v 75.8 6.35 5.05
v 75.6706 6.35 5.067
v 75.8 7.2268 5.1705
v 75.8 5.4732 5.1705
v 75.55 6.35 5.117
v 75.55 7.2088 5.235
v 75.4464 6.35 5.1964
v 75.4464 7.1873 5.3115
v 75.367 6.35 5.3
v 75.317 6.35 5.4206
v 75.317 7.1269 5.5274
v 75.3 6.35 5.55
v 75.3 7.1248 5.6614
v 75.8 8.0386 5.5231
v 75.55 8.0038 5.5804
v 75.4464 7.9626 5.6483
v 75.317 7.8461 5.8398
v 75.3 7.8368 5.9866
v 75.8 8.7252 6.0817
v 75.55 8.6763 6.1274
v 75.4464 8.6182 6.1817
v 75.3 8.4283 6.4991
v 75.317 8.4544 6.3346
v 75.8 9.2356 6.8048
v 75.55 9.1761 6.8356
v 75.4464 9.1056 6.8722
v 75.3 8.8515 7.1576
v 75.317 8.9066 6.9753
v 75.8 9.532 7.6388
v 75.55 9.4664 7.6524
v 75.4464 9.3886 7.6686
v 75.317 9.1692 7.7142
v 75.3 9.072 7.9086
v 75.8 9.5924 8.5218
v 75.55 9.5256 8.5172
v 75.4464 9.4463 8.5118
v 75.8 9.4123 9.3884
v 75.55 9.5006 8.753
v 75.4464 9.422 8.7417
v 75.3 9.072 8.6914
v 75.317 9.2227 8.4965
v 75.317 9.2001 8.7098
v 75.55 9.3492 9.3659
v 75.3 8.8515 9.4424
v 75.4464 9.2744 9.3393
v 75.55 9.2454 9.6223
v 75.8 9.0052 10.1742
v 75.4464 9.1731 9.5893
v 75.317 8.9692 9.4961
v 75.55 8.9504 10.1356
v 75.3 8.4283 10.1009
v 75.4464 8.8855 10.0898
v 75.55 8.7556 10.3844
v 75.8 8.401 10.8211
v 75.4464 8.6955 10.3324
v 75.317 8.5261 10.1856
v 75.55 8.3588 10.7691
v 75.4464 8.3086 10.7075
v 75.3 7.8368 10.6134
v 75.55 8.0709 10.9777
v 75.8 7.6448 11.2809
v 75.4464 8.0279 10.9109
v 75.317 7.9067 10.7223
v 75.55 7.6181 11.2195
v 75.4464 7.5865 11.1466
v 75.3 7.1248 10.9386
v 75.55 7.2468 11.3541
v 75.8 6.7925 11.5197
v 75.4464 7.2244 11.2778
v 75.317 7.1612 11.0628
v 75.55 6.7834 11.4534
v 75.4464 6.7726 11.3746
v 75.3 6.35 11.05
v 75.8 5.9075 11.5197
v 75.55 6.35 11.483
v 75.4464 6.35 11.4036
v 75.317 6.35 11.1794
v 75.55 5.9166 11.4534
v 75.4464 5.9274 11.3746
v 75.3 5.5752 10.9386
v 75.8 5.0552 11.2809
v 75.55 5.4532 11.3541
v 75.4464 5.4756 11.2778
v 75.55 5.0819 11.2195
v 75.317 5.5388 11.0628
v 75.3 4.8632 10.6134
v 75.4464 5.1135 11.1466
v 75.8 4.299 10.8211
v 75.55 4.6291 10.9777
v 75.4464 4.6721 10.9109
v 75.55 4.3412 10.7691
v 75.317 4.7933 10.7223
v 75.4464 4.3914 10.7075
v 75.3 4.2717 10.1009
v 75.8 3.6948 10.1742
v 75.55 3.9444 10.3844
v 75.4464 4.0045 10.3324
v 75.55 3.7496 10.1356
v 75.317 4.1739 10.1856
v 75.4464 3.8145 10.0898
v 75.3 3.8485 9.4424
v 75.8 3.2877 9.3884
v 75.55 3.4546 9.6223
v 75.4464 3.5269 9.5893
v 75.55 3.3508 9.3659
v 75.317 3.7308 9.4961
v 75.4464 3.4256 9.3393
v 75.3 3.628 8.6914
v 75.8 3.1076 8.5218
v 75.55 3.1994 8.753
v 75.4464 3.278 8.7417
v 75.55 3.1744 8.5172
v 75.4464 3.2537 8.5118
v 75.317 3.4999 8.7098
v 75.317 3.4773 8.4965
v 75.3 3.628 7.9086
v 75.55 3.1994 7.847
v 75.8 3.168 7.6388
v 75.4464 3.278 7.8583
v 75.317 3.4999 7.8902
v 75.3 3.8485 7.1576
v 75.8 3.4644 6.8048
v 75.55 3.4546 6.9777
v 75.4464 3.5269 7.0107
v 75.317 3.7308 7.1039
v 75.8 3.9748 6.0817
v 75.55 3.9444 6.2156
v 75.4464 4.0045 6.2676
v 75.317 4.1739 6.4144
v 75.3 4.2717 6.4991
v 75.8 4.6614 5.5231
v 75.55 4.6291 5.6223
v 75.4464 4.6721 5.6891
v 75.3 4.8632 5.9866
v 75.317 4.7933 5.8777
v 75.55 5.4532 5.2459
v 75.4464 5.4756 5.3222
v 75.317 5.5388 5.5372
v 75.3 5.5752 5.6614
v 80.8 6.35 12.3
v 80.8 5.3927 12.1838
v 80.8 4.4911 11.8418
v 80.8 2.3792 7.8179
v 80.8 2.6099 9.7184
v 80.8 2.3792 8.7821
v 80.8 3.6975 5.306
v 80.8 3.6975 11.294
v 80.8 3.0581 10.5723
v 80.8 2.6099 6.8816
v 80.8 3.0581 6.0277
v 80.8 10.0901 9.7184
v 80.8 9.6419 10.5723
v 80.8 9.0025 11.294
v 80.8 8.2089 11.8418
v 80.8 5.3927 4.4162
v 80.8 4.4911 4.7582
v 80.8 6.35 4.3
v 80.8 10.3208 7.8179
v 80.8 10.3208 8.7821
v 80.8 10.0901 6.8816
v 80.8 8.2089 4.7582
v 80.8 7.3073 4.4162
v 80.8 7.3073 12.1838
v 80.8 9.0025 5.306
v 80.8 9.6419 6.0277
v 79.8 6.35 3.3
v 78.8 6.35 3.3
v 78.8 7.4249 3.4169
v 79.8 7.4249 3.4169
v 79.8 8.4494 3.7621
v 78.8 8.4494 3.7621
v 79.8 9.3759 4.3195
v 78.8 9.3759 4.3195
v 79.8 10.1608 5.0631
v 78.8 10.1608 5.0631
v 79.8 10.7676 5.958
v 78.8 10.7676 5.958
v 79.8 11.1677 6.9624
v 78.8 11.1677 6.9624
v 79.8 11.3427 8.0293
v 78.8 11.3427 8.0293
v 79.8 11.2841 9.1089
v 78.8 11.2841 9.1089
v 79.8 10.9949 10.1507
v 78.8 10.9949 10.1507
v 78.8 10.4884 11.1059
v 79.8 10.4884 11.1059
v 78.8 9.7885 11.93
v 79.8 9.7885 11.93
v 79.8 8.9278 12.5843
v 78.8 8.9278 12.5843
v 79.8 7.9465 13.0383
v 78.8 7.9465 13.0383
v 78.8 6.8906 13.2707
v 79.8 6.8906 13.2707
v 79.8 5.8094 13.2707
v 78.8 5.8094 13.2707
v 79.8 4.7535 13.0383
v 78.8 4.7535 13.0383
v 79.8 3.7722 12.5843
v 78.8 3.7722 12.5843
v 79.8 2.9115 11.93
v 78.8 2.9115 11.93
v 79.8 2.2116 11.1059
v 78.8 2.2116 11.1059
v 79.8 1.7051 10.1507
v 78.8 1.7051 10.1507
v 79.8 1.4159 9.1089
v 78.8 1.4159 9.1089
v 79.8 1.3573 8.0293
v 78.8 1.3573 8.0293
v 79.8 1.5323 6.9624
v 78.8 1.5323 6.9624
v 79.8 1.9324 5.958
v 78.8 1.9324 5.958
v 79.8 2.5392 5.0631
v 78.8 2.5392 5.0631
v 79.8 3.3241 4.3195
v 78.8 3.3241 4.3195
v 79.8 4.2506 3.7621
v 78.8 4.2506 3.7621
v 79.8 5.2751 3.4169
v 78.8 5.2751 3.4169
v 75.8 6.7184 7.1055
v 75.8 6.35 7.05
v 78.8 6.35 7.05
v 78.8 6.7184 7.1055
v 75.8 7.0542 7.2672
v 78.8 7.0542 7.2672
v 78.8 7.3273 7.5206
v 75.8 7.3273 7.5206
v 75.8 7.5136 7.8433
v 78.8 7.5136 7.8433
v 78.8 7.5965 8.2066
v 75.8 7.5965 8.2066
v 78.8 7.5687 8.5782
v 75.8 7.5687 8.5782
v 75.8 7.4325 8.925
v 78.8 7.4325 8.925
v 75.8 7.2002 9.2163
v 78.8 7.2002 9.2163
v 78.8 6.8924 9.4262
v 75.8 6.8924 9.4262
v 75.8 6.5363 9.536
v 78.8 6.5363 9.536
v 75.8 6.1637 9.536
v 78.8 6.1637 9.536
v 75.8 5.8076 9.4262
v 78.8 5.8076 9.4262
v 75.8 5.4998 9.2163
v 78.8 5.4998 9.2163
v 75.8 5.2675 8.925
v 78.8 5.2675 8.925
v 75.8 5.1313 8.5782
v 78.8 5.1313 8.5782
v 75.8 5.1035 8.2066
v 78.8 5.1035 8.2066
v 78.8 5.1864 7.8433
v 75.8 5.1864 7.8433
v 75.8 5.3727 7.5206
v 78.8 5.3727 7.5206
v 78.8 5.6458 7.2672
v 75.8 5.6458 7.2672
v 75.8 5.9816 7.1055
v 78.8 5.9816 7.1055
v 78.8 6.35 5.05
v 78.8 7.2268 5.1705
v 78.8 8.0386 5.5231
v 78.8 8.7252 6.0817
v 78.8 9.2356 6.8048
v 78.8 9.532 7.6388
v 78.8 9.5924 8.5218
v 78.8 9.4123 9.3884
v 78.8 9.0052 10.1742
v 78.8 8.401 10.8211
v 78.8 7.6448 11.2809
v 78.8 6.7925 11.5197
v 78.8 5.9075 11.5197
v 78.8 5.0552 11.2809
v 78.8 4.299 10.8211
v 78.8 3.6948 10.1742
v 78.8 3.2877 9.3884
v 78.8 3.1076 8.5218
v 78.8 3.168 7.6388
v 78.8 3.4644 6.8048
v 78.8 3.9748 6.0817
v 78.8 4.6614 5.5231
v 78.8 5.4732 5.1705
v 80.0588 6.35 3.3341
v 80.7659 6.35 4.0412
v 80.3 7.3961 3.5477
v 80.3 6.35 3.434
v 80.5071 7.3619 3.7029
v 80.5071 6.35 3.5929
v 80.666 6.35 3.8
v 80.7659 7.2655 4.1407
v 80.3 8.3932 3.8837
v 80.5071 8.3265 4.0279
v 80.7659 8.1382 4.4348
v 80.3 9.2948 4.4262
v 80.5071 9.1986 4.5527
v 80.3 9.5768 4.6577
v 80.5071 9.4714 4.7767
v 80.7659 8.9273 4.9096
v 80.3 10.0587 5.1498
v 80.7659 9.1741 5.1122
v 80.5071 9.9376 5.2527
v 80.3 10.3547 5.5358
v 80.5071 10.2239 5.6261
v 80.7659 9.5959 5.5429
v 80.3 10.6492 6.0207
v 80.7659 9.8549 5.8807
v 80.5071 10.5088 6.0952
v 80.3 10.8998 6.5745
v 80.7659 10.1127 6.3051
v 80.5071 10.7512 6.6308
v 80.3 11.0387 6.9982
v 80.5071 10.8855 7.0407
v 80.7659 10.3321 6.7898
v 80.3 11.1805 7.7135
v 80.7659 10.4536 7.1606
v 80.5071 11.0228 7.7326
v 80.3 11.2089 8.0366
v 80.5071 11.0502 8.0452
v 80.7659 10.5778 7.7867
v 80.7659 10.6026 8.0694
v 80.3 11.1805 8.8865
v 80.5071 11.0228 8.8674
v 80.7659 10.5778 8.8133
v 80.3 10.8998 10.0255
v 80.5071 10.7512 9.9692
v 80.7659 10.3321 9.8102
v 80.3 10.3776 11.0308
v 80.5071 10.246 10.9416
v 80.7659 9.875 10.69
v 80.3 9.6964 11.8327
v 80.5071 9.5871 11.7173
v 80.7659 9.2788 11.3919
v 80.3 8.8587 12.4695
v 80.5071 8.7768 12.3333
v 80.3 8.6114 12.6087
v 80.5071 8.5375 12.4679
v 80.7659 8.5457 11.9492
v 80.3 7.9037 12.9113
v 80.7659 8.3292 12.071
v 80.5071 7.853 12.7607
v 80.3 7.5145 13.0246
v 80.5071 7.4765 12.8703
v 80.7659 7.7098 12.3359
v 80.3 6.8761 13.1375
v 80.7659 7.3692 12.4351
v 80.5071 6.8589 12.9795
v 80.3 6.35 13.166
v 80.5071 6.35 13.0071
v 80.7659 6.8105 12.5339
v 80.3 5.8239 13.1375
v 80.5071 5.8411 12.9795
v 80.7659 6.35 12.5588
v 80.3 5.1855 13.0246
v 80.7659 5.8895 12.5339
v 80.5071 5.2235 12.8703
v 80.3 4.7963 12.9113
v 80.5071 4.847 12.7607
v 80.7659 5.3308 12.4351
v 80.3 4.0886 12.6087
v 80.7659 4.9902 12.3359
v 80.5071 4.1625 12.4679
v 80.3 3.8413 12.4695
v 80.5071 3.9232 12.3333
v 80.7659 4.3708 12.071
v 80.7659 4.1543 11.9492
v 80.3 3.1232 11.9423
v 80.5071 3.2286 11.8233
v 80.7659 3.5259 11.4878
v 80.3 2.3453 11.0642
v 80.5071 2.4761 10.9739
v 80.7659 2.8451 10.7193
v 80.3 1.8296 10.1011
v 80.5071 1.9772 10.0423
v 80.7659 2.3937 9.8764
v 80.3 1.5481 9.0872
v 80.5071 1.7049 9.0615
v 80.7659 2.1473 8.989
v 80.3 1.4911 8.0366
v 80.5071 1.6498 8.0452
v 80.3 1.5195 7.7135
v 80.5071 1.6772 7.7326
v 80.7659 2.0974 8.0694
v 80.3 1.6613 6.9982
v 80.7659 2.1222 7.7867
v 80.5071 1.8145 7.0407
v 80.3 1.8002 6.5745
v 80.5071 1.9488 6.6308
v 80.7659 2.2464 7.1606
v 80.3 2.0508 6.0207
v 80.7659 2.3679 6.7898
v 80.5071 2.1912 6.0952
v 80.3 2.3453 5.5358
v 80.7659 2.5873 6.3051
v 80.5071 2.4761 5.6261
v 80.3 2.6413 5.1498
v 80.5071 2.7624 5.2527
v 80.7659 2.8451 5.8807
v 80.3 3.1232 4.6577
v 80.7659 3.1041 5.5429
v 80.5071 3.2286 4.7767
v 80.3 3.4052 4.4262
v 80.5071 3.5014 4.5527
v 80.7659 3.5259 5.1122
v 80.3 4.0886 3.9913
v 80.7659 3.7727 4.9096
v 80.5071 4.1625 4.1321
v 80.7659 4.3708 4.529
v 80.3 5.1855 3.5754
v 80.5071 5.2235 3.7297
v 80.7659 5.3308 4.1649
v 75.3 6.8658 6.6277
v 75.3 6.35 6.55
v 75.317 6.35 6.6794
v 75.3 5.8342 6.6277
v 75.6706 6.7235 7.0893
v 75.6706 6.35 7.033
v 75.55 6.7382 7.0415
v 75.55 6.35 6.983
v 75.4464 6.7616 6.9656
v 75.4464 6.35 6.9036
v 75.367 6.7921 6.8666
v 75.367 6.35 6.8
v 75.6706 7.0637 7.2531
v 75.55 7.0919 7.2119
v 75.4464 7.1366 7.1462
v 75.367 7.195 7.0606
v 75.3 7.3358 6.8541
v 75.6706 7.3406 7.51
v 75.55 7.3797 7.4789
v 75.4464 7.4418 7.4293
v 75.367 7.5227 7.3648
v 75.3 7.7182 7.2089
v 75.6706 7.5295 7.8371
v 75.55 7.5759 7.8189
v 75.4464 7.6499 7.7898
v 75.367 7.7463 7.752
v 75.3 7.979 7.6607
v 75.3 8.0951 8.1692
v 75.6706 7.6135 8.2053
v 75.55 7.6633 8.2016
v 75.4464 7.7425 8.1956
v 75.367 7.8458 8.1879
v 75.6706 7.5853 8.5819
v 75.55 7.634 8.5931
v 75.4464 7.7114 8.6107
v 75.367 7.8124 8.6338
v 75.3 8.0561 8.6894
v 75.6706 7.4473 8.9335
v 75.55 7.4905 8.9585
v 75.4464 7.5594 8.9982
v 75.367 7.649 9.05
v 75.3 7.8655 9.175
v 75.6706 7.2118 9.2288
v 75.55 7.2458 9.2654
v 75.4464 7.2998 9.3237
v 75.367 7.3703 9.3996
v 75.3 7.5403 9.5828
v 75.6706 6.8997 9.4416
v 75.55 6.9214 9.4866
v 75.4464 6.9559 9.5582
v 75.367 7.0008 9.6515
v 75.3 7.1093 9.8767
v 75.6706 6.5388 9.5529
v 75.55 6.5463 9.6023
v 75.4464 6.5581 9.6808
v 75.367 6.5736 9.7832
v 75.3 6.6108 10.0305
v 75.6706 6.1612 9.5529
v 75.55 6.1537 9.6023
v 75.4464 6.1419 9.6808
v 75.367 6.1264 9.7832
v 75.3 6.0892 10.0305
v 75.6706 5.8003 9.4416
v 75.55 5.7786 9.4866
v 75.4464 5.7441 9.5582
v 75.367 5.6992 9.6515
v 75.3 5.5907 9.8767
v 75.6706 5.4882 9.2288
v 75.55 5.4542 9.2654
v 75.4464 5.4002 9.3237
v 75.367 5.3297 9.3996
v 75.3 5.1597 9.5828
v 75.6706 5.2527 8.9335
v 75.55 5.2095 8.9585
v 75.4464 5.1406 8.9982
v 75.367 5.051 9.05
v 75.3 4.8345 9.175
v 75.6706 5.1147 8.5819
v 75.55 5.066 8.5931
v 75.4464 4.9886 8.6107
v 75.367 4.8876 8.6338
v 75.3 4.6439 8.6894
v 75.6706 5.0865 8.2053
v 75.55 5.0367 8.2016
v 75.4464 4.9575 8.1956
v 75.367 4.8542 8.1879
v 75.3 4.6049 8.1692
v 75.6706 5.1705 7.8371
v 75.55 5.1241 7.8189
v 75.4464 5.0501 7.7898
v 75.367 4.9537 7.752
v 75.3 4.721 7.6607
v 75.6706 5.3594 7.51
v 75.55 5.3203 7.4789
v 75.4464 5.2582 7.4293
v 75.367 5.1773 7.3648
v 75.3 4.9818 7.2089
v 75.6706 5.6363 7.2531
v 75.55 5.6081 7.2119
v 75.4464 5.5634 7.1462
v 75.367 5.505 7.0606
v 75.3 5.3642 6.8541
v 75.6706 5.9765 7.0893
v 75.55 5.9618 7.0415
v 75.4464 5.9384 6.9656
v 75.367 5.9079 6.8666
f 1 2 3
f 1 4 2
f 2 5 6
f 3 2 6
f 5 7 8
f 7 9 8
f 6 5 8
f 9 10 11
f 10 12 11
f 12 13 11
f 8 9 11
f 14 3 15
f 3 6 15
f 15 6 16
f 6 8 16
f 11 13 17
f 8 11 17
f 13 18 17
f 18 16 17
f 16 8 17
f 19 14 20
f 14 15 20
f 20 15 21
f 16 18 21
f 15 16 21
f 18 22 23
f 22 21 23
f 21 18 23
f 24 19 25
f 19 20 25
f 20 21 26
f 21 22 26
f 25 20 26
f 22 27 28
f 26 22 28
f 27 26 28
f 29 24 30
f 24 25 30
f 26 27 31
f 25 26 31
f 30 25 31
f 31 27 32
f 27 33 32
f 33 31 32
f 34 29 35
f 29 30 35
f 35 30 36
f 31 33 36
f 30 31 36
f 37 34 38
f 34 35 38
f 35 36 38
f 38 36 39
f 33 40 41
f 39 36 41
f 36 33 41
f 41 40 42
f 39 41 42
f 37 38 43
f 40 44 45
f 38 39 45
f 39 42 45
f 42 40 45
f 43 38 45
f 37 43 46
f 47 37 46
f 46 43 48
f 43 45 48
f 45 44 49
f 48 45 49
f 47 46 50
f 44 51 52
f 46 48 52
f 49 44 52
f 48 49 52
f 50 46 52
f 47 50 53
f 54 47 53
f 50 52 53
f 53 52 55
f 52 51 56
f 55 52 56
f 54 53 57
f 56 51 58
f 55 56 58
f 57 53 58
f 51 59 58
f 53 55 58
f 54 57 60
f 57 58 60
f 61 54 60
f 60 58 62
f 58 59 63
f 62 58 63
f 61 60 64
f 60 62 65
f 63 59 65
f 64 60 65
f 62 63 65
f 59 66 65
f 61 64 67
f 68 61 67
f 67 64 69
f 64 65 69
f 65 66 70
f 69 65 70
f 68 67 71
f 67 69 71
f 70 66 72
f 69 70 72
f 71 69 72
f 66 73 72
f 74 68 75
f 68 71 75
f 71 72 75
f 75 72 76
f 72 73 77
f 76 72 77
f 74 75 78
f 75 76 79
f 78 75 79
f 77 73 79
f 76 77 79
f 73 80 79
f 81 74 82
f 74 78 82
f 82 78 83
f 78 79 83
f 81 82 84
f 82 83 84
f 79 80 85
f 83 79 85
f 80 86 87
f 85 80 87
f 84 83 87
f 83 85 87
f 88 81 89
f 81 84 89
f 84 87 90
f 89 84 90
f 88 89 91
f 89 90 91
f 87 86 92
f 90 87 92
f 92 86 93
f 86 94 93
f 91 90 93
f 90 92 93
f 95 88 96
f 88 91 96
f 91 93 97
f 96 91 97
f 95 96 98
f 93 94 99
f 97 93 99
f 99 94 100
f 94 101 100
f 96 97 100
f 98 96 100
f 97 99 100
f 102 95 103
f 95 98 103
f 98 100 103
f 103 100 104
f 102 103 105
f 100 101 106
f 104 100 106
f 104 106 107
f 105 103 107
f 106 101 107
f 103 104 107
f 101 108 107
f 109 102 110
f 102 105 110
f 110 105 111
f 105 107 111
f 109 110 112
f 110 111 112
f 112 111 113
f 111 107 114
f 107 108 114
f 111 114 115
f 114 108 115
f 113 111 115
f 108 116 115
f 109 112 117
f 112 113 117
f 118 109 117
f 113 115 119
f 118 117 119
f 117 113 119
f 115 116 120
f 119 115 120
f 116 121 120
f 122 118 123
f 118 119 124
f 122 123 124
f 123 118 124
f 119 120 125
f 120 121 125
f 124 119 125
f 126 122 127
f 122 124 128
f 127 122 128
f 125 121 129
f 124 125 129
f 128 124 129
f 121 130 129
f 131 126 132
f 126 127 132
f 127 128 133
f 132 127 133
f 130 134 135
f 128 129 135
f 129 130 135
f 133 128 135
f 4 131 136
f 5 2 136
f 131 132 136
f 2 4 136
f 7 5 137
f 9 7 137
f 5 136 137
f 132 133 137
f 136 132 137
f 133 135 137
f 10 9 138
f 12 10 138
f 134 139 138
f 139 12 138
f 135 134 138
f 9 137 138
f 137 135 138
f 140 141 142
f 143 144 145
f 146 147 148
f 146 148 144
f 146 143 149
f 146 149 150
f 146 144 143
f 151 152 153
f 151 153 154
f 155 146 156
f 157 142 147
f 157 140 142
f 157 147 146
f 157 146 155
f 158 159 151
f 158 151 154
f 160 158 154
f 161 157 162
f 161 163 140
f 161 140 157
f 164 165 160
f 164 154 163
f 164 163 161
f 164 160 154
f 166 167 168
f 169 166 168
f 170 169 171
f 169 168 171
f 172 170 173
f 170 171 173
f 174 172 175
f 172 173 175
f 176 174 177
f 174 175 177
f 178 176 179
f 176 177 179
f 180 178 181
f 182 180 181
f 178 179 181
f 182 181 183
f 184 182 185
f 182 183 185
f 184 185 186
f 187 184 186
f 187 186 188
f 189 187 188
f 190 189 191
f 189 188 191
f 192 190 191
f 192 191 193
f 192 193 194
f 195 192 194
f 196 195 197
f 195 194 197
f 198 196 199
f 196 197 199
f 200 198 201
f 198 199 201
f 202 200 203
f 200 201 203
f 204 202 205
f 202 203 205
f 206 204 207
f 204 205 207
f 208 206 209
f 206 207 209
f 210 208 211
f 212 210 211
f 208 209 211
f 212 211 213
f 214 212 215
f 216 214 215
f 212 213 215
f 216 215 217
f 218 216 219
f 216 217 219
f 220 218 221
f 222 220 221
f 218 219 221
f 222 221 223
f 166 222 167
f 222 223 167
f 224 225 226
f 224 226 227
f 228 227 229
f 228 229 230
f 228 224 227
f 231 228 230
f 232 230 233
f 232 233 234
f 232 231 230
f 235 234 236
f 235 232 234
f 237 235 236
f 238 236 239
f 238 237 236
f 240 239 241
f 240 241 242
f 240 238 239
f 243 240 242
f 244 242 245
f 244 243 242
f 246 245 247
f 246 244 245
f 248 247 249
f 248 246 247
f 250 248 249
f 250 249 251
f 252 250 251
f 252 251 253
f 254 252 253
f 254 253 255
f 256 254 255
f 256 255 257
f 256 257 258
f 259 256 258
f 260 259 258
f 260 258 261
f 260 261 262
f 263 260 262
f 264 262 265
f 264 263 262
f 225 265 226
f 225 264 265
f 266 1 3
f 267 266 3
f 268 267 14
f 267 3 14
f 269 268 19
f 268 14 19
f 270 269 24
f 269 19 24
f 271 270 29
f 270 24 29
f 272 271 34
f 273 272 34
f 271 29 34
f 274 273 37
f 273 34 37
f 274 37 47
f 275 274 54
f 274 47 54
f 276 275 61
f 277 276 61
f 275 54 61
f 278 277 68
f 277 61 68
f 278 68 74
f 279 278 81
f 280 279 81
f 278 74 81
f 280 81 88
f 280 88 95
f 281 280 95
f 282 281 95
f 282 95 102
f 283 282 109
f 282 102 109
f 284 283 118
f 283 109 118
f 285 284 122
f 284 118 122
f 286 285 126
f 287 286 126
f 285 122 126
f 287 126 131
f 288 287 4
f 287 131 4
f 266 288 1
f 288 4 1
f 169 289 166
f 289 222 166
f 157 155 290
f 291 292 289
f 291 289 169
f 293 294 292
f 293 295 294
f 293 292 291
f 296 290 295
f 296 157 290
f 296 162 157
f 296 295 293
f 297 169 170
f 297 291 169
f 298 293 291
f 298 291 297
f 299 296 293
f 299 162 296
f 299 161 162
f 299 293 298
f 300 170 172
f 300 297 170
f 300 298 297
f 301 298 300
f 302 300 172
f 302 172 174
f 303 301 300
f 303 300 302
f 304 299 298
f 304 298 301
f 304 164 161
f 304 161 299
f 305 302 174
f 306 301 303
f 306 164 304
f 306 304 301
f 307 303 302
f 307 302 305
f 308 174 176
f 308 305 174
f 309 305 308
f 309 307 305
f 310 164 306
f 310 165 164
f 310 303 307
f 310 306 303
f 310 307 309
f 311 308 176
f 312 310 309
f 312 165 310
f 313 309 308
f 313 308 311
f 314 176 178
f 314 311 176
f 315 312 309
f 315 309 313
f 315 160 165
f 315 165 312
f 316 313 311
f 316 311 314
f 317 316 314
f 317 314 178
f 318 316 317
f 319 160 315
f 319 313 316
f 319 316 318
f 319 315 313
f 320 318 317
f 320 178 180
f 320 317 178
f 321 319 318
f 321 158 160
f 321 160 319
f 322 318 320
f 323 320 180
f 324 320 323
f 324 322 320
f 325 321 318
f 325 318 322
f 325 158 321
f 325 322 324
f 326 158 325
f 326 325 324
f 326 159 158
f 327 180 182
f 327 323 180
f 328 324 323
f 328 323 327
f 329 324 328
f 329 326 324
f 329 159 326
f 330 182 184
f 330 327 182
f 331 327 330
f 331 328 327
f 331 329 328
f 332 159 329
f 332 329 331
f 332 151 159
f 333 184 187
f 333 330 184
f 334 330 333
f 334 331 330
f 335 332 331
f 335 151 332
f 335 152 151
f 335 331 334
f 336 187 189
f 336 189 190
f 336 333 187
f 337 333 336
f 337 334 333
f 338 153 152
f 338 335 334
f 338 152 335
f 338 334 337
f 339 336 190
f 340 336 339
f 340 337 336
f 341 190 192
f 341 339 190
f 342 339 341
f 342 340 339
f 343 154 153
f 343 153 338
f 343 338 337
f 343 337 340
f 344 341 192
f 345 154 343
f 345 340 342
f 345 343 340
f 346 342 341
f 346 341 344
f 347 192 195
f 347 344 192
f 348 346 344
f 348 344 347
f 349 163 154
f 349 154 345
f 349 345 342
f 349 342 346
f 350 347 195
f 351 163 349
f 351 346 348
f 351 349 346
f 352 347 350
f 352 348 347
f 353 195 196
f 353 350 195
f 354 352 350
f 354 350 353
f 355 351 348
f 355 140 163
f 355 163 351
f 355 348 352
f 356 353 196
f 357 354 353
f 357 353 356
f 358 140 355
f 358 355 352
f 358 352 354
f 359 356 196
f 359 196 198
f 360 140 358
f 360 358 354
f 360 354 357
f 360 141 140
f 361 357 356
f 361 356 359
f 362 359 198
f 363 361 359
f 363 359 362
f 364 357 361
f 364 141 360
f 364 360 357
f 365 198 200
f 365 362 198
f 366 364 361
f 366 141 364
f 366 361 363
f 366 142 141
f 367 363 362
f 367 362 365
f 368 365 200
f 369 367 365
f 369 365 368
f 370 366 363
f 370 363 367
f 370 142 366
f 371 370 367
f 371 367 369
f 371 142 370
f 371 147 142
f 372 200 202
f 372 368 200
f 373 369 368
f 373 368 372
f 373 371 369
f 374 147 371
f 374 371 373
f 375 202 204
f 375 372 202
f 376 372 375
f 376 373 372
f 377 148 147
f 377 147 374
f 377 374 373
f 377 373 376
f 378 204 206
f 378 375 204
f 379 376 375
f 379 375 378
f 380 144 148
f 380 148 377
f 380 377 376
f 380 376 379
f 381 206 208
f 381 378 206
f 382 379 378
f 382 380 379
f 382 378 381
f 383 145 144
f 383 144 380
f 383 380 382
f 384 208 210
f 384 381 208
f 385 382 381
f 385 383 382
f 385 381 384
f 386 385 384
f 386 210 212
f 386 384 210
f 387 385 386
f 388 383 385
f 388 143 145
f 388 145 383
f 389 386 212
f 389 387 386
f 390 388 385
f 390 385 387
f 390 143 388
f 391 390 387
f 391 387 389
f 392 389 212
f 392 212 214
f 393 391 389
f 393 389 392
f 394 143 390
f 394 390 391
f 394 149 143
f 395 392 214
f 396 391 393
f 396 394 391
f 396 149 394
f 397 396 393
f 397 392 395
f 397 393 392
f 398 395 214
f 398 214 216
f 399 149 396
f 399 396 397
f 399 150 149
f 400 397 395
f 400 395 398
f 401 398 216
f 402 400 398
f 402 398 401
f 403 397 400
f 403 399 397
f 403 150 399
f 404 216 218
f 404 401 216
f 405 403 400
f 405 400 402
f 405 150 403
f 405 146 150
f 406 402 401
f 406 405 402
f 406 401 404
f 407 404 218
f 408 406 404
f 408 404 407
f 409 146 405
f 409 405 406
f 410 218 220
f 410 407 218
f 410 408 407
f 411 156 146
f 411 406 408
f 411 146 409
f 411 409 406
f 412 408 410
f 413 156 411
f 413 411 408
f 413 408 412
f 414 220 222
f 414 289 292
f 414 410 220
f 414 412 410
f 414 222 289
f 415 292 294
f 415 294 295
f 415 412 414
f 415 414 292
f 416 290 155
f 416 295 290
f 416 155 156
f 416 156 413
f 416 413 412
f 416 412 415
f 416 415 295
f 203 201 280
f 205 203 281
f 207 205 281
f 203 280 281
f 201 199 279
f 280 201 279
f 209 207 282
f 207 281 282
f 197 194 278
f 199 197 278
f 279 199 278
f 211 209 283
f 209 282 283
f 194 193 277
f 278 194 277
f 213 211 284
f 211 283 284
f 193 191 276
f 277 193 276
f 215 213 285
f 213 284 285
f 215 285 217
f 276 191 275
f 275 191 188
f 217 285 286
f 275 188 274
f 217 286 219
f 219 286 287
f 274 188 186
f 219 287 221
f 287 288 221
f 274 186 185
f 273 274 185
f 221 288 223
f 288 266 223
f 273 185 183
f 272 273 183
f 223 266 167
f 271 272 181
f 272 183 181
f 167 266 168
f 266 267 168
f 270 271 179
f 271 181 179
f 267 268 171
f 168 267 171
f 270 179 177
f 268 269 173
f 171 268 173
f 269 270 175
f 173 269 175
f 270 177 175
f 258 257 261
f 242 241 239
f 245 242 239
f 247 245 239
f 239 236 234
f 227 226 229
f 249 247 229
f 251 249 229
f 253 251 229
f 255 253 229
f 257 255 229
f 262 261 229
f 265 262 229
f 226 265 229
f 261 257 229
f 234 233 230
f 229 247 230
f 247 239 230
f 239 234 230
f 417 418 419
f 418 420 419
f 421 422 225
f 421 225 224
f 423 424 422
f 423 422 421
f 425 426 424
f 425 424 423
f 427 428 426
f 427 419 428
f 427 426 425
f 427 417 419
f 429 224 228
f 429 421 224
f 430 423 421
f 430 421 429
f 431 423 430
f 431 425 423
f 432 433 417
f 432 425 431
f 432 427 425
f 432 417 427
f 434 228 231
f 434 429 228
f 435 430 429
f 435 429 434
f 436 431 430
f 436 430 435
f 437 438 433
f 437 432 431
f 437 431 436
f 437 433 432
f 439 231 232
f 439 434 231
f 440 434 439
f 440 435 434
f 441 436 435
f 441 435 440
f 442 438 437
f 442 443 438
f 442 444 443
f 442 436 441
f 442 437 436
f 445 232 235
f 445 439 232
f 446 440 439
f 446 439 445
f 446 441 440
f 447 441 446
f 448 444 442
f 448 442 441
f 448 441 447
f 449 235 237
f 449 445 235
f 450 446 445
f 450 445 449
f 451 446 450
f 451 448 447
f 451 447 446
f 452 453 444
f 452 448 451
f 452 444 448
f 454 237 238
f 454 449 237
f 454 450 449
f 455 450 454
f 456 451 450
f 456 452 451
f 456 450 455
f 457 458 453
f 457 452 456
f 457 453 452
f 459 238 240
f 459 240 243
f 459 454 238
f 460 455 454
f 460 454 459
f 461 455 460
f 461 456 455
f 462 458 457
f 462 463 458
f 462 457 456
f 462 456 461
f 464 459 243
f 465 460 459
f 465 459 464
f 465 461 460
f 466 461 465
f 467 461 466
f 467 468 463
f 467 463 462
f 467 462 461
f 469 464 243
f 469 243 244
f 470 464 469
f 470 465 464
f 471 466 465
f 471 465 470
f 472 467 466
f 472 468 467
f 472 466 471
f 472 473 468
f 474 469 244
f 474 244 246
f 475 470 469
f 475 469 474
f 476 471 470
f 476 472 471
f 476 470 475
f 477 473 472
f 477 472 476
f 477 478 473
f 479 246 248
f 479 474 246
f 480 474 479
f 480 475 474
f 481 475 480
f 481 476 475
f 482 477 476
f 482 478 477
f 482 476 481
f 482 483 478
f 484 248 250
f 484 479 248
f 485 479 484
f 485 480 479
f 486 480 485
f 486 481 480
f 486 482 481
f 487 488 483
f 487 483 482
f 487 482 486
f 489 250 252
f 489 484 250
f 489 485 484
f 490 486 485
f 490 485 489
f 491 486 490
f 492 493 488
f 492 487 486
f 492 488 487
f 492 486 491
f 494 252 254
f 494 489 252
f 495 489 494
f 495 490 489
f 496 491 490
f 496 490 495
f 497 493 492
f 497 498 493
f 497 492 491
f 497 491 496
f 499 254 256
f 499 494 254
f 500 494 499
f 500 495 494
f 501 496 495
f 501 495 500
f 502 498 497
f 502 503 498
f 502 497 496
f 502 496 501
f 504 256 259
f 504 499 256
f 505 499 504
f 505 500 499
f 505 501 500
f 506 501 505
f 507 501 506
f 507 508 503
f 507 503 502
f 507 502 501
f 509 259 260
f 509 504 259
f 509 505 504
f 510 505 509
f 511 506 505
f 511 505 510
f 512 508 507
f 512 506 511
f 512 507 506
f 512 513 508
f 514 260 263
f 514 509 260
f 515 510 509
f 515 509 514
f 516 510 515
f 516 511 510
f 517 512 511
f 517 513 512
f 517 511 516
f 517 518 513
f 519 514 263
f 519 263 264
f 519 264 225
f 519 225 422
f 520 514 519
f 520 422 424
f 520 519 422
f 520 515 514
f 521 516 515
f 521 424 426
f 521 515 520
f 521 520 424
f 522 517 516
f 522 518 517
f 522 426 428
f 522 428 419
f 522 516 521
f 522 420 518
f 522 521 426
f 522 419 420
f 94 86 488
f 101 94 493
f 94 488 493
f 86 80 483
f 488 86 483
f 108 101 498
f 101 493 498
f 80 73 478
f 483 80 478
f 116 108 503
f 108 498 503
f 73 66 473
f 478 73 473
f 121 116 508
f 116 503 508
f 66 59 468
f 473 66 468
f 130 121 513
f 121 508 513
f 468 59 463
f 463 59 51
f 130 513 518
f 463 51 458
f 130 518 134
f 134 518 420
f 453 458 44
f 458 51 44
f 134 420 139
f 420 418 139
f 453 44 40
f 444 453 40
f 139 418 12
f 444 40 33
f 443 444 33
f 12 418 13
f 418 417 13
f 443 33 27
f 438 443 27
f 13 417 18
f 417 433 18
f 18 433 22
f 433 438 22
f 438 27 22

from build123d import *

# Parameters (mm, degrees)
TUBE_R            = 3.25
TUBE_R_2          = 1.25
TUBE_DEPTH        = 3.5
FILLET008_R       = 0.5
CYLINDER033_R     = 5
CYLINDER033_DEPTH = 2
FILLET007_R       = 1


with BuildPart() as fillet008:
    # Tube → Tube (new body)
    with BuildSketch(Plane(origin=(75.3, 6.35, 8.3), x_dir=(0, 0, -1), z_dir=(1, 0, 0))):
        Circle(TUBE_R)
        Circle(TUBE_R_2, mode=Mode.SUBTRACT)
    extrude(amount=TUBE_DEPTH)

    # Fillet008
    fillet008_edges = [fillet008.edges().sort_by_distance(p)[0] for p in [
        (75.3, 6.35, 11.55),
        (75.3, 6.35, 9.55),
    ]]
    fillet(fillet008_edges, radius=FILLET008_R)


with BuildPart() as dc_cap:
    # Cylinder033 → Cylinder033 (new body)
    with BuildSketch(Plane(origin=(78.8, 6.35, 8.3), x_dir=(0, 0, -1), z_dir=(1, 0, 0))):
        Circle(CYLINDER033_R)
    extrude(amount=CYLINDER033_DEPTH)

    # Fillet007
    fillet007_edges = [dc_cap.edges().sort_by_distance(p)[0] for p in [
        (80.8, 6.35, 13.3),
    ]]
    fillet(fillet007_edges, radius=FILLET007_R)

    # Fusion028: union Fillet008
    add(fillet008.part)


solid = dc_cap.part
